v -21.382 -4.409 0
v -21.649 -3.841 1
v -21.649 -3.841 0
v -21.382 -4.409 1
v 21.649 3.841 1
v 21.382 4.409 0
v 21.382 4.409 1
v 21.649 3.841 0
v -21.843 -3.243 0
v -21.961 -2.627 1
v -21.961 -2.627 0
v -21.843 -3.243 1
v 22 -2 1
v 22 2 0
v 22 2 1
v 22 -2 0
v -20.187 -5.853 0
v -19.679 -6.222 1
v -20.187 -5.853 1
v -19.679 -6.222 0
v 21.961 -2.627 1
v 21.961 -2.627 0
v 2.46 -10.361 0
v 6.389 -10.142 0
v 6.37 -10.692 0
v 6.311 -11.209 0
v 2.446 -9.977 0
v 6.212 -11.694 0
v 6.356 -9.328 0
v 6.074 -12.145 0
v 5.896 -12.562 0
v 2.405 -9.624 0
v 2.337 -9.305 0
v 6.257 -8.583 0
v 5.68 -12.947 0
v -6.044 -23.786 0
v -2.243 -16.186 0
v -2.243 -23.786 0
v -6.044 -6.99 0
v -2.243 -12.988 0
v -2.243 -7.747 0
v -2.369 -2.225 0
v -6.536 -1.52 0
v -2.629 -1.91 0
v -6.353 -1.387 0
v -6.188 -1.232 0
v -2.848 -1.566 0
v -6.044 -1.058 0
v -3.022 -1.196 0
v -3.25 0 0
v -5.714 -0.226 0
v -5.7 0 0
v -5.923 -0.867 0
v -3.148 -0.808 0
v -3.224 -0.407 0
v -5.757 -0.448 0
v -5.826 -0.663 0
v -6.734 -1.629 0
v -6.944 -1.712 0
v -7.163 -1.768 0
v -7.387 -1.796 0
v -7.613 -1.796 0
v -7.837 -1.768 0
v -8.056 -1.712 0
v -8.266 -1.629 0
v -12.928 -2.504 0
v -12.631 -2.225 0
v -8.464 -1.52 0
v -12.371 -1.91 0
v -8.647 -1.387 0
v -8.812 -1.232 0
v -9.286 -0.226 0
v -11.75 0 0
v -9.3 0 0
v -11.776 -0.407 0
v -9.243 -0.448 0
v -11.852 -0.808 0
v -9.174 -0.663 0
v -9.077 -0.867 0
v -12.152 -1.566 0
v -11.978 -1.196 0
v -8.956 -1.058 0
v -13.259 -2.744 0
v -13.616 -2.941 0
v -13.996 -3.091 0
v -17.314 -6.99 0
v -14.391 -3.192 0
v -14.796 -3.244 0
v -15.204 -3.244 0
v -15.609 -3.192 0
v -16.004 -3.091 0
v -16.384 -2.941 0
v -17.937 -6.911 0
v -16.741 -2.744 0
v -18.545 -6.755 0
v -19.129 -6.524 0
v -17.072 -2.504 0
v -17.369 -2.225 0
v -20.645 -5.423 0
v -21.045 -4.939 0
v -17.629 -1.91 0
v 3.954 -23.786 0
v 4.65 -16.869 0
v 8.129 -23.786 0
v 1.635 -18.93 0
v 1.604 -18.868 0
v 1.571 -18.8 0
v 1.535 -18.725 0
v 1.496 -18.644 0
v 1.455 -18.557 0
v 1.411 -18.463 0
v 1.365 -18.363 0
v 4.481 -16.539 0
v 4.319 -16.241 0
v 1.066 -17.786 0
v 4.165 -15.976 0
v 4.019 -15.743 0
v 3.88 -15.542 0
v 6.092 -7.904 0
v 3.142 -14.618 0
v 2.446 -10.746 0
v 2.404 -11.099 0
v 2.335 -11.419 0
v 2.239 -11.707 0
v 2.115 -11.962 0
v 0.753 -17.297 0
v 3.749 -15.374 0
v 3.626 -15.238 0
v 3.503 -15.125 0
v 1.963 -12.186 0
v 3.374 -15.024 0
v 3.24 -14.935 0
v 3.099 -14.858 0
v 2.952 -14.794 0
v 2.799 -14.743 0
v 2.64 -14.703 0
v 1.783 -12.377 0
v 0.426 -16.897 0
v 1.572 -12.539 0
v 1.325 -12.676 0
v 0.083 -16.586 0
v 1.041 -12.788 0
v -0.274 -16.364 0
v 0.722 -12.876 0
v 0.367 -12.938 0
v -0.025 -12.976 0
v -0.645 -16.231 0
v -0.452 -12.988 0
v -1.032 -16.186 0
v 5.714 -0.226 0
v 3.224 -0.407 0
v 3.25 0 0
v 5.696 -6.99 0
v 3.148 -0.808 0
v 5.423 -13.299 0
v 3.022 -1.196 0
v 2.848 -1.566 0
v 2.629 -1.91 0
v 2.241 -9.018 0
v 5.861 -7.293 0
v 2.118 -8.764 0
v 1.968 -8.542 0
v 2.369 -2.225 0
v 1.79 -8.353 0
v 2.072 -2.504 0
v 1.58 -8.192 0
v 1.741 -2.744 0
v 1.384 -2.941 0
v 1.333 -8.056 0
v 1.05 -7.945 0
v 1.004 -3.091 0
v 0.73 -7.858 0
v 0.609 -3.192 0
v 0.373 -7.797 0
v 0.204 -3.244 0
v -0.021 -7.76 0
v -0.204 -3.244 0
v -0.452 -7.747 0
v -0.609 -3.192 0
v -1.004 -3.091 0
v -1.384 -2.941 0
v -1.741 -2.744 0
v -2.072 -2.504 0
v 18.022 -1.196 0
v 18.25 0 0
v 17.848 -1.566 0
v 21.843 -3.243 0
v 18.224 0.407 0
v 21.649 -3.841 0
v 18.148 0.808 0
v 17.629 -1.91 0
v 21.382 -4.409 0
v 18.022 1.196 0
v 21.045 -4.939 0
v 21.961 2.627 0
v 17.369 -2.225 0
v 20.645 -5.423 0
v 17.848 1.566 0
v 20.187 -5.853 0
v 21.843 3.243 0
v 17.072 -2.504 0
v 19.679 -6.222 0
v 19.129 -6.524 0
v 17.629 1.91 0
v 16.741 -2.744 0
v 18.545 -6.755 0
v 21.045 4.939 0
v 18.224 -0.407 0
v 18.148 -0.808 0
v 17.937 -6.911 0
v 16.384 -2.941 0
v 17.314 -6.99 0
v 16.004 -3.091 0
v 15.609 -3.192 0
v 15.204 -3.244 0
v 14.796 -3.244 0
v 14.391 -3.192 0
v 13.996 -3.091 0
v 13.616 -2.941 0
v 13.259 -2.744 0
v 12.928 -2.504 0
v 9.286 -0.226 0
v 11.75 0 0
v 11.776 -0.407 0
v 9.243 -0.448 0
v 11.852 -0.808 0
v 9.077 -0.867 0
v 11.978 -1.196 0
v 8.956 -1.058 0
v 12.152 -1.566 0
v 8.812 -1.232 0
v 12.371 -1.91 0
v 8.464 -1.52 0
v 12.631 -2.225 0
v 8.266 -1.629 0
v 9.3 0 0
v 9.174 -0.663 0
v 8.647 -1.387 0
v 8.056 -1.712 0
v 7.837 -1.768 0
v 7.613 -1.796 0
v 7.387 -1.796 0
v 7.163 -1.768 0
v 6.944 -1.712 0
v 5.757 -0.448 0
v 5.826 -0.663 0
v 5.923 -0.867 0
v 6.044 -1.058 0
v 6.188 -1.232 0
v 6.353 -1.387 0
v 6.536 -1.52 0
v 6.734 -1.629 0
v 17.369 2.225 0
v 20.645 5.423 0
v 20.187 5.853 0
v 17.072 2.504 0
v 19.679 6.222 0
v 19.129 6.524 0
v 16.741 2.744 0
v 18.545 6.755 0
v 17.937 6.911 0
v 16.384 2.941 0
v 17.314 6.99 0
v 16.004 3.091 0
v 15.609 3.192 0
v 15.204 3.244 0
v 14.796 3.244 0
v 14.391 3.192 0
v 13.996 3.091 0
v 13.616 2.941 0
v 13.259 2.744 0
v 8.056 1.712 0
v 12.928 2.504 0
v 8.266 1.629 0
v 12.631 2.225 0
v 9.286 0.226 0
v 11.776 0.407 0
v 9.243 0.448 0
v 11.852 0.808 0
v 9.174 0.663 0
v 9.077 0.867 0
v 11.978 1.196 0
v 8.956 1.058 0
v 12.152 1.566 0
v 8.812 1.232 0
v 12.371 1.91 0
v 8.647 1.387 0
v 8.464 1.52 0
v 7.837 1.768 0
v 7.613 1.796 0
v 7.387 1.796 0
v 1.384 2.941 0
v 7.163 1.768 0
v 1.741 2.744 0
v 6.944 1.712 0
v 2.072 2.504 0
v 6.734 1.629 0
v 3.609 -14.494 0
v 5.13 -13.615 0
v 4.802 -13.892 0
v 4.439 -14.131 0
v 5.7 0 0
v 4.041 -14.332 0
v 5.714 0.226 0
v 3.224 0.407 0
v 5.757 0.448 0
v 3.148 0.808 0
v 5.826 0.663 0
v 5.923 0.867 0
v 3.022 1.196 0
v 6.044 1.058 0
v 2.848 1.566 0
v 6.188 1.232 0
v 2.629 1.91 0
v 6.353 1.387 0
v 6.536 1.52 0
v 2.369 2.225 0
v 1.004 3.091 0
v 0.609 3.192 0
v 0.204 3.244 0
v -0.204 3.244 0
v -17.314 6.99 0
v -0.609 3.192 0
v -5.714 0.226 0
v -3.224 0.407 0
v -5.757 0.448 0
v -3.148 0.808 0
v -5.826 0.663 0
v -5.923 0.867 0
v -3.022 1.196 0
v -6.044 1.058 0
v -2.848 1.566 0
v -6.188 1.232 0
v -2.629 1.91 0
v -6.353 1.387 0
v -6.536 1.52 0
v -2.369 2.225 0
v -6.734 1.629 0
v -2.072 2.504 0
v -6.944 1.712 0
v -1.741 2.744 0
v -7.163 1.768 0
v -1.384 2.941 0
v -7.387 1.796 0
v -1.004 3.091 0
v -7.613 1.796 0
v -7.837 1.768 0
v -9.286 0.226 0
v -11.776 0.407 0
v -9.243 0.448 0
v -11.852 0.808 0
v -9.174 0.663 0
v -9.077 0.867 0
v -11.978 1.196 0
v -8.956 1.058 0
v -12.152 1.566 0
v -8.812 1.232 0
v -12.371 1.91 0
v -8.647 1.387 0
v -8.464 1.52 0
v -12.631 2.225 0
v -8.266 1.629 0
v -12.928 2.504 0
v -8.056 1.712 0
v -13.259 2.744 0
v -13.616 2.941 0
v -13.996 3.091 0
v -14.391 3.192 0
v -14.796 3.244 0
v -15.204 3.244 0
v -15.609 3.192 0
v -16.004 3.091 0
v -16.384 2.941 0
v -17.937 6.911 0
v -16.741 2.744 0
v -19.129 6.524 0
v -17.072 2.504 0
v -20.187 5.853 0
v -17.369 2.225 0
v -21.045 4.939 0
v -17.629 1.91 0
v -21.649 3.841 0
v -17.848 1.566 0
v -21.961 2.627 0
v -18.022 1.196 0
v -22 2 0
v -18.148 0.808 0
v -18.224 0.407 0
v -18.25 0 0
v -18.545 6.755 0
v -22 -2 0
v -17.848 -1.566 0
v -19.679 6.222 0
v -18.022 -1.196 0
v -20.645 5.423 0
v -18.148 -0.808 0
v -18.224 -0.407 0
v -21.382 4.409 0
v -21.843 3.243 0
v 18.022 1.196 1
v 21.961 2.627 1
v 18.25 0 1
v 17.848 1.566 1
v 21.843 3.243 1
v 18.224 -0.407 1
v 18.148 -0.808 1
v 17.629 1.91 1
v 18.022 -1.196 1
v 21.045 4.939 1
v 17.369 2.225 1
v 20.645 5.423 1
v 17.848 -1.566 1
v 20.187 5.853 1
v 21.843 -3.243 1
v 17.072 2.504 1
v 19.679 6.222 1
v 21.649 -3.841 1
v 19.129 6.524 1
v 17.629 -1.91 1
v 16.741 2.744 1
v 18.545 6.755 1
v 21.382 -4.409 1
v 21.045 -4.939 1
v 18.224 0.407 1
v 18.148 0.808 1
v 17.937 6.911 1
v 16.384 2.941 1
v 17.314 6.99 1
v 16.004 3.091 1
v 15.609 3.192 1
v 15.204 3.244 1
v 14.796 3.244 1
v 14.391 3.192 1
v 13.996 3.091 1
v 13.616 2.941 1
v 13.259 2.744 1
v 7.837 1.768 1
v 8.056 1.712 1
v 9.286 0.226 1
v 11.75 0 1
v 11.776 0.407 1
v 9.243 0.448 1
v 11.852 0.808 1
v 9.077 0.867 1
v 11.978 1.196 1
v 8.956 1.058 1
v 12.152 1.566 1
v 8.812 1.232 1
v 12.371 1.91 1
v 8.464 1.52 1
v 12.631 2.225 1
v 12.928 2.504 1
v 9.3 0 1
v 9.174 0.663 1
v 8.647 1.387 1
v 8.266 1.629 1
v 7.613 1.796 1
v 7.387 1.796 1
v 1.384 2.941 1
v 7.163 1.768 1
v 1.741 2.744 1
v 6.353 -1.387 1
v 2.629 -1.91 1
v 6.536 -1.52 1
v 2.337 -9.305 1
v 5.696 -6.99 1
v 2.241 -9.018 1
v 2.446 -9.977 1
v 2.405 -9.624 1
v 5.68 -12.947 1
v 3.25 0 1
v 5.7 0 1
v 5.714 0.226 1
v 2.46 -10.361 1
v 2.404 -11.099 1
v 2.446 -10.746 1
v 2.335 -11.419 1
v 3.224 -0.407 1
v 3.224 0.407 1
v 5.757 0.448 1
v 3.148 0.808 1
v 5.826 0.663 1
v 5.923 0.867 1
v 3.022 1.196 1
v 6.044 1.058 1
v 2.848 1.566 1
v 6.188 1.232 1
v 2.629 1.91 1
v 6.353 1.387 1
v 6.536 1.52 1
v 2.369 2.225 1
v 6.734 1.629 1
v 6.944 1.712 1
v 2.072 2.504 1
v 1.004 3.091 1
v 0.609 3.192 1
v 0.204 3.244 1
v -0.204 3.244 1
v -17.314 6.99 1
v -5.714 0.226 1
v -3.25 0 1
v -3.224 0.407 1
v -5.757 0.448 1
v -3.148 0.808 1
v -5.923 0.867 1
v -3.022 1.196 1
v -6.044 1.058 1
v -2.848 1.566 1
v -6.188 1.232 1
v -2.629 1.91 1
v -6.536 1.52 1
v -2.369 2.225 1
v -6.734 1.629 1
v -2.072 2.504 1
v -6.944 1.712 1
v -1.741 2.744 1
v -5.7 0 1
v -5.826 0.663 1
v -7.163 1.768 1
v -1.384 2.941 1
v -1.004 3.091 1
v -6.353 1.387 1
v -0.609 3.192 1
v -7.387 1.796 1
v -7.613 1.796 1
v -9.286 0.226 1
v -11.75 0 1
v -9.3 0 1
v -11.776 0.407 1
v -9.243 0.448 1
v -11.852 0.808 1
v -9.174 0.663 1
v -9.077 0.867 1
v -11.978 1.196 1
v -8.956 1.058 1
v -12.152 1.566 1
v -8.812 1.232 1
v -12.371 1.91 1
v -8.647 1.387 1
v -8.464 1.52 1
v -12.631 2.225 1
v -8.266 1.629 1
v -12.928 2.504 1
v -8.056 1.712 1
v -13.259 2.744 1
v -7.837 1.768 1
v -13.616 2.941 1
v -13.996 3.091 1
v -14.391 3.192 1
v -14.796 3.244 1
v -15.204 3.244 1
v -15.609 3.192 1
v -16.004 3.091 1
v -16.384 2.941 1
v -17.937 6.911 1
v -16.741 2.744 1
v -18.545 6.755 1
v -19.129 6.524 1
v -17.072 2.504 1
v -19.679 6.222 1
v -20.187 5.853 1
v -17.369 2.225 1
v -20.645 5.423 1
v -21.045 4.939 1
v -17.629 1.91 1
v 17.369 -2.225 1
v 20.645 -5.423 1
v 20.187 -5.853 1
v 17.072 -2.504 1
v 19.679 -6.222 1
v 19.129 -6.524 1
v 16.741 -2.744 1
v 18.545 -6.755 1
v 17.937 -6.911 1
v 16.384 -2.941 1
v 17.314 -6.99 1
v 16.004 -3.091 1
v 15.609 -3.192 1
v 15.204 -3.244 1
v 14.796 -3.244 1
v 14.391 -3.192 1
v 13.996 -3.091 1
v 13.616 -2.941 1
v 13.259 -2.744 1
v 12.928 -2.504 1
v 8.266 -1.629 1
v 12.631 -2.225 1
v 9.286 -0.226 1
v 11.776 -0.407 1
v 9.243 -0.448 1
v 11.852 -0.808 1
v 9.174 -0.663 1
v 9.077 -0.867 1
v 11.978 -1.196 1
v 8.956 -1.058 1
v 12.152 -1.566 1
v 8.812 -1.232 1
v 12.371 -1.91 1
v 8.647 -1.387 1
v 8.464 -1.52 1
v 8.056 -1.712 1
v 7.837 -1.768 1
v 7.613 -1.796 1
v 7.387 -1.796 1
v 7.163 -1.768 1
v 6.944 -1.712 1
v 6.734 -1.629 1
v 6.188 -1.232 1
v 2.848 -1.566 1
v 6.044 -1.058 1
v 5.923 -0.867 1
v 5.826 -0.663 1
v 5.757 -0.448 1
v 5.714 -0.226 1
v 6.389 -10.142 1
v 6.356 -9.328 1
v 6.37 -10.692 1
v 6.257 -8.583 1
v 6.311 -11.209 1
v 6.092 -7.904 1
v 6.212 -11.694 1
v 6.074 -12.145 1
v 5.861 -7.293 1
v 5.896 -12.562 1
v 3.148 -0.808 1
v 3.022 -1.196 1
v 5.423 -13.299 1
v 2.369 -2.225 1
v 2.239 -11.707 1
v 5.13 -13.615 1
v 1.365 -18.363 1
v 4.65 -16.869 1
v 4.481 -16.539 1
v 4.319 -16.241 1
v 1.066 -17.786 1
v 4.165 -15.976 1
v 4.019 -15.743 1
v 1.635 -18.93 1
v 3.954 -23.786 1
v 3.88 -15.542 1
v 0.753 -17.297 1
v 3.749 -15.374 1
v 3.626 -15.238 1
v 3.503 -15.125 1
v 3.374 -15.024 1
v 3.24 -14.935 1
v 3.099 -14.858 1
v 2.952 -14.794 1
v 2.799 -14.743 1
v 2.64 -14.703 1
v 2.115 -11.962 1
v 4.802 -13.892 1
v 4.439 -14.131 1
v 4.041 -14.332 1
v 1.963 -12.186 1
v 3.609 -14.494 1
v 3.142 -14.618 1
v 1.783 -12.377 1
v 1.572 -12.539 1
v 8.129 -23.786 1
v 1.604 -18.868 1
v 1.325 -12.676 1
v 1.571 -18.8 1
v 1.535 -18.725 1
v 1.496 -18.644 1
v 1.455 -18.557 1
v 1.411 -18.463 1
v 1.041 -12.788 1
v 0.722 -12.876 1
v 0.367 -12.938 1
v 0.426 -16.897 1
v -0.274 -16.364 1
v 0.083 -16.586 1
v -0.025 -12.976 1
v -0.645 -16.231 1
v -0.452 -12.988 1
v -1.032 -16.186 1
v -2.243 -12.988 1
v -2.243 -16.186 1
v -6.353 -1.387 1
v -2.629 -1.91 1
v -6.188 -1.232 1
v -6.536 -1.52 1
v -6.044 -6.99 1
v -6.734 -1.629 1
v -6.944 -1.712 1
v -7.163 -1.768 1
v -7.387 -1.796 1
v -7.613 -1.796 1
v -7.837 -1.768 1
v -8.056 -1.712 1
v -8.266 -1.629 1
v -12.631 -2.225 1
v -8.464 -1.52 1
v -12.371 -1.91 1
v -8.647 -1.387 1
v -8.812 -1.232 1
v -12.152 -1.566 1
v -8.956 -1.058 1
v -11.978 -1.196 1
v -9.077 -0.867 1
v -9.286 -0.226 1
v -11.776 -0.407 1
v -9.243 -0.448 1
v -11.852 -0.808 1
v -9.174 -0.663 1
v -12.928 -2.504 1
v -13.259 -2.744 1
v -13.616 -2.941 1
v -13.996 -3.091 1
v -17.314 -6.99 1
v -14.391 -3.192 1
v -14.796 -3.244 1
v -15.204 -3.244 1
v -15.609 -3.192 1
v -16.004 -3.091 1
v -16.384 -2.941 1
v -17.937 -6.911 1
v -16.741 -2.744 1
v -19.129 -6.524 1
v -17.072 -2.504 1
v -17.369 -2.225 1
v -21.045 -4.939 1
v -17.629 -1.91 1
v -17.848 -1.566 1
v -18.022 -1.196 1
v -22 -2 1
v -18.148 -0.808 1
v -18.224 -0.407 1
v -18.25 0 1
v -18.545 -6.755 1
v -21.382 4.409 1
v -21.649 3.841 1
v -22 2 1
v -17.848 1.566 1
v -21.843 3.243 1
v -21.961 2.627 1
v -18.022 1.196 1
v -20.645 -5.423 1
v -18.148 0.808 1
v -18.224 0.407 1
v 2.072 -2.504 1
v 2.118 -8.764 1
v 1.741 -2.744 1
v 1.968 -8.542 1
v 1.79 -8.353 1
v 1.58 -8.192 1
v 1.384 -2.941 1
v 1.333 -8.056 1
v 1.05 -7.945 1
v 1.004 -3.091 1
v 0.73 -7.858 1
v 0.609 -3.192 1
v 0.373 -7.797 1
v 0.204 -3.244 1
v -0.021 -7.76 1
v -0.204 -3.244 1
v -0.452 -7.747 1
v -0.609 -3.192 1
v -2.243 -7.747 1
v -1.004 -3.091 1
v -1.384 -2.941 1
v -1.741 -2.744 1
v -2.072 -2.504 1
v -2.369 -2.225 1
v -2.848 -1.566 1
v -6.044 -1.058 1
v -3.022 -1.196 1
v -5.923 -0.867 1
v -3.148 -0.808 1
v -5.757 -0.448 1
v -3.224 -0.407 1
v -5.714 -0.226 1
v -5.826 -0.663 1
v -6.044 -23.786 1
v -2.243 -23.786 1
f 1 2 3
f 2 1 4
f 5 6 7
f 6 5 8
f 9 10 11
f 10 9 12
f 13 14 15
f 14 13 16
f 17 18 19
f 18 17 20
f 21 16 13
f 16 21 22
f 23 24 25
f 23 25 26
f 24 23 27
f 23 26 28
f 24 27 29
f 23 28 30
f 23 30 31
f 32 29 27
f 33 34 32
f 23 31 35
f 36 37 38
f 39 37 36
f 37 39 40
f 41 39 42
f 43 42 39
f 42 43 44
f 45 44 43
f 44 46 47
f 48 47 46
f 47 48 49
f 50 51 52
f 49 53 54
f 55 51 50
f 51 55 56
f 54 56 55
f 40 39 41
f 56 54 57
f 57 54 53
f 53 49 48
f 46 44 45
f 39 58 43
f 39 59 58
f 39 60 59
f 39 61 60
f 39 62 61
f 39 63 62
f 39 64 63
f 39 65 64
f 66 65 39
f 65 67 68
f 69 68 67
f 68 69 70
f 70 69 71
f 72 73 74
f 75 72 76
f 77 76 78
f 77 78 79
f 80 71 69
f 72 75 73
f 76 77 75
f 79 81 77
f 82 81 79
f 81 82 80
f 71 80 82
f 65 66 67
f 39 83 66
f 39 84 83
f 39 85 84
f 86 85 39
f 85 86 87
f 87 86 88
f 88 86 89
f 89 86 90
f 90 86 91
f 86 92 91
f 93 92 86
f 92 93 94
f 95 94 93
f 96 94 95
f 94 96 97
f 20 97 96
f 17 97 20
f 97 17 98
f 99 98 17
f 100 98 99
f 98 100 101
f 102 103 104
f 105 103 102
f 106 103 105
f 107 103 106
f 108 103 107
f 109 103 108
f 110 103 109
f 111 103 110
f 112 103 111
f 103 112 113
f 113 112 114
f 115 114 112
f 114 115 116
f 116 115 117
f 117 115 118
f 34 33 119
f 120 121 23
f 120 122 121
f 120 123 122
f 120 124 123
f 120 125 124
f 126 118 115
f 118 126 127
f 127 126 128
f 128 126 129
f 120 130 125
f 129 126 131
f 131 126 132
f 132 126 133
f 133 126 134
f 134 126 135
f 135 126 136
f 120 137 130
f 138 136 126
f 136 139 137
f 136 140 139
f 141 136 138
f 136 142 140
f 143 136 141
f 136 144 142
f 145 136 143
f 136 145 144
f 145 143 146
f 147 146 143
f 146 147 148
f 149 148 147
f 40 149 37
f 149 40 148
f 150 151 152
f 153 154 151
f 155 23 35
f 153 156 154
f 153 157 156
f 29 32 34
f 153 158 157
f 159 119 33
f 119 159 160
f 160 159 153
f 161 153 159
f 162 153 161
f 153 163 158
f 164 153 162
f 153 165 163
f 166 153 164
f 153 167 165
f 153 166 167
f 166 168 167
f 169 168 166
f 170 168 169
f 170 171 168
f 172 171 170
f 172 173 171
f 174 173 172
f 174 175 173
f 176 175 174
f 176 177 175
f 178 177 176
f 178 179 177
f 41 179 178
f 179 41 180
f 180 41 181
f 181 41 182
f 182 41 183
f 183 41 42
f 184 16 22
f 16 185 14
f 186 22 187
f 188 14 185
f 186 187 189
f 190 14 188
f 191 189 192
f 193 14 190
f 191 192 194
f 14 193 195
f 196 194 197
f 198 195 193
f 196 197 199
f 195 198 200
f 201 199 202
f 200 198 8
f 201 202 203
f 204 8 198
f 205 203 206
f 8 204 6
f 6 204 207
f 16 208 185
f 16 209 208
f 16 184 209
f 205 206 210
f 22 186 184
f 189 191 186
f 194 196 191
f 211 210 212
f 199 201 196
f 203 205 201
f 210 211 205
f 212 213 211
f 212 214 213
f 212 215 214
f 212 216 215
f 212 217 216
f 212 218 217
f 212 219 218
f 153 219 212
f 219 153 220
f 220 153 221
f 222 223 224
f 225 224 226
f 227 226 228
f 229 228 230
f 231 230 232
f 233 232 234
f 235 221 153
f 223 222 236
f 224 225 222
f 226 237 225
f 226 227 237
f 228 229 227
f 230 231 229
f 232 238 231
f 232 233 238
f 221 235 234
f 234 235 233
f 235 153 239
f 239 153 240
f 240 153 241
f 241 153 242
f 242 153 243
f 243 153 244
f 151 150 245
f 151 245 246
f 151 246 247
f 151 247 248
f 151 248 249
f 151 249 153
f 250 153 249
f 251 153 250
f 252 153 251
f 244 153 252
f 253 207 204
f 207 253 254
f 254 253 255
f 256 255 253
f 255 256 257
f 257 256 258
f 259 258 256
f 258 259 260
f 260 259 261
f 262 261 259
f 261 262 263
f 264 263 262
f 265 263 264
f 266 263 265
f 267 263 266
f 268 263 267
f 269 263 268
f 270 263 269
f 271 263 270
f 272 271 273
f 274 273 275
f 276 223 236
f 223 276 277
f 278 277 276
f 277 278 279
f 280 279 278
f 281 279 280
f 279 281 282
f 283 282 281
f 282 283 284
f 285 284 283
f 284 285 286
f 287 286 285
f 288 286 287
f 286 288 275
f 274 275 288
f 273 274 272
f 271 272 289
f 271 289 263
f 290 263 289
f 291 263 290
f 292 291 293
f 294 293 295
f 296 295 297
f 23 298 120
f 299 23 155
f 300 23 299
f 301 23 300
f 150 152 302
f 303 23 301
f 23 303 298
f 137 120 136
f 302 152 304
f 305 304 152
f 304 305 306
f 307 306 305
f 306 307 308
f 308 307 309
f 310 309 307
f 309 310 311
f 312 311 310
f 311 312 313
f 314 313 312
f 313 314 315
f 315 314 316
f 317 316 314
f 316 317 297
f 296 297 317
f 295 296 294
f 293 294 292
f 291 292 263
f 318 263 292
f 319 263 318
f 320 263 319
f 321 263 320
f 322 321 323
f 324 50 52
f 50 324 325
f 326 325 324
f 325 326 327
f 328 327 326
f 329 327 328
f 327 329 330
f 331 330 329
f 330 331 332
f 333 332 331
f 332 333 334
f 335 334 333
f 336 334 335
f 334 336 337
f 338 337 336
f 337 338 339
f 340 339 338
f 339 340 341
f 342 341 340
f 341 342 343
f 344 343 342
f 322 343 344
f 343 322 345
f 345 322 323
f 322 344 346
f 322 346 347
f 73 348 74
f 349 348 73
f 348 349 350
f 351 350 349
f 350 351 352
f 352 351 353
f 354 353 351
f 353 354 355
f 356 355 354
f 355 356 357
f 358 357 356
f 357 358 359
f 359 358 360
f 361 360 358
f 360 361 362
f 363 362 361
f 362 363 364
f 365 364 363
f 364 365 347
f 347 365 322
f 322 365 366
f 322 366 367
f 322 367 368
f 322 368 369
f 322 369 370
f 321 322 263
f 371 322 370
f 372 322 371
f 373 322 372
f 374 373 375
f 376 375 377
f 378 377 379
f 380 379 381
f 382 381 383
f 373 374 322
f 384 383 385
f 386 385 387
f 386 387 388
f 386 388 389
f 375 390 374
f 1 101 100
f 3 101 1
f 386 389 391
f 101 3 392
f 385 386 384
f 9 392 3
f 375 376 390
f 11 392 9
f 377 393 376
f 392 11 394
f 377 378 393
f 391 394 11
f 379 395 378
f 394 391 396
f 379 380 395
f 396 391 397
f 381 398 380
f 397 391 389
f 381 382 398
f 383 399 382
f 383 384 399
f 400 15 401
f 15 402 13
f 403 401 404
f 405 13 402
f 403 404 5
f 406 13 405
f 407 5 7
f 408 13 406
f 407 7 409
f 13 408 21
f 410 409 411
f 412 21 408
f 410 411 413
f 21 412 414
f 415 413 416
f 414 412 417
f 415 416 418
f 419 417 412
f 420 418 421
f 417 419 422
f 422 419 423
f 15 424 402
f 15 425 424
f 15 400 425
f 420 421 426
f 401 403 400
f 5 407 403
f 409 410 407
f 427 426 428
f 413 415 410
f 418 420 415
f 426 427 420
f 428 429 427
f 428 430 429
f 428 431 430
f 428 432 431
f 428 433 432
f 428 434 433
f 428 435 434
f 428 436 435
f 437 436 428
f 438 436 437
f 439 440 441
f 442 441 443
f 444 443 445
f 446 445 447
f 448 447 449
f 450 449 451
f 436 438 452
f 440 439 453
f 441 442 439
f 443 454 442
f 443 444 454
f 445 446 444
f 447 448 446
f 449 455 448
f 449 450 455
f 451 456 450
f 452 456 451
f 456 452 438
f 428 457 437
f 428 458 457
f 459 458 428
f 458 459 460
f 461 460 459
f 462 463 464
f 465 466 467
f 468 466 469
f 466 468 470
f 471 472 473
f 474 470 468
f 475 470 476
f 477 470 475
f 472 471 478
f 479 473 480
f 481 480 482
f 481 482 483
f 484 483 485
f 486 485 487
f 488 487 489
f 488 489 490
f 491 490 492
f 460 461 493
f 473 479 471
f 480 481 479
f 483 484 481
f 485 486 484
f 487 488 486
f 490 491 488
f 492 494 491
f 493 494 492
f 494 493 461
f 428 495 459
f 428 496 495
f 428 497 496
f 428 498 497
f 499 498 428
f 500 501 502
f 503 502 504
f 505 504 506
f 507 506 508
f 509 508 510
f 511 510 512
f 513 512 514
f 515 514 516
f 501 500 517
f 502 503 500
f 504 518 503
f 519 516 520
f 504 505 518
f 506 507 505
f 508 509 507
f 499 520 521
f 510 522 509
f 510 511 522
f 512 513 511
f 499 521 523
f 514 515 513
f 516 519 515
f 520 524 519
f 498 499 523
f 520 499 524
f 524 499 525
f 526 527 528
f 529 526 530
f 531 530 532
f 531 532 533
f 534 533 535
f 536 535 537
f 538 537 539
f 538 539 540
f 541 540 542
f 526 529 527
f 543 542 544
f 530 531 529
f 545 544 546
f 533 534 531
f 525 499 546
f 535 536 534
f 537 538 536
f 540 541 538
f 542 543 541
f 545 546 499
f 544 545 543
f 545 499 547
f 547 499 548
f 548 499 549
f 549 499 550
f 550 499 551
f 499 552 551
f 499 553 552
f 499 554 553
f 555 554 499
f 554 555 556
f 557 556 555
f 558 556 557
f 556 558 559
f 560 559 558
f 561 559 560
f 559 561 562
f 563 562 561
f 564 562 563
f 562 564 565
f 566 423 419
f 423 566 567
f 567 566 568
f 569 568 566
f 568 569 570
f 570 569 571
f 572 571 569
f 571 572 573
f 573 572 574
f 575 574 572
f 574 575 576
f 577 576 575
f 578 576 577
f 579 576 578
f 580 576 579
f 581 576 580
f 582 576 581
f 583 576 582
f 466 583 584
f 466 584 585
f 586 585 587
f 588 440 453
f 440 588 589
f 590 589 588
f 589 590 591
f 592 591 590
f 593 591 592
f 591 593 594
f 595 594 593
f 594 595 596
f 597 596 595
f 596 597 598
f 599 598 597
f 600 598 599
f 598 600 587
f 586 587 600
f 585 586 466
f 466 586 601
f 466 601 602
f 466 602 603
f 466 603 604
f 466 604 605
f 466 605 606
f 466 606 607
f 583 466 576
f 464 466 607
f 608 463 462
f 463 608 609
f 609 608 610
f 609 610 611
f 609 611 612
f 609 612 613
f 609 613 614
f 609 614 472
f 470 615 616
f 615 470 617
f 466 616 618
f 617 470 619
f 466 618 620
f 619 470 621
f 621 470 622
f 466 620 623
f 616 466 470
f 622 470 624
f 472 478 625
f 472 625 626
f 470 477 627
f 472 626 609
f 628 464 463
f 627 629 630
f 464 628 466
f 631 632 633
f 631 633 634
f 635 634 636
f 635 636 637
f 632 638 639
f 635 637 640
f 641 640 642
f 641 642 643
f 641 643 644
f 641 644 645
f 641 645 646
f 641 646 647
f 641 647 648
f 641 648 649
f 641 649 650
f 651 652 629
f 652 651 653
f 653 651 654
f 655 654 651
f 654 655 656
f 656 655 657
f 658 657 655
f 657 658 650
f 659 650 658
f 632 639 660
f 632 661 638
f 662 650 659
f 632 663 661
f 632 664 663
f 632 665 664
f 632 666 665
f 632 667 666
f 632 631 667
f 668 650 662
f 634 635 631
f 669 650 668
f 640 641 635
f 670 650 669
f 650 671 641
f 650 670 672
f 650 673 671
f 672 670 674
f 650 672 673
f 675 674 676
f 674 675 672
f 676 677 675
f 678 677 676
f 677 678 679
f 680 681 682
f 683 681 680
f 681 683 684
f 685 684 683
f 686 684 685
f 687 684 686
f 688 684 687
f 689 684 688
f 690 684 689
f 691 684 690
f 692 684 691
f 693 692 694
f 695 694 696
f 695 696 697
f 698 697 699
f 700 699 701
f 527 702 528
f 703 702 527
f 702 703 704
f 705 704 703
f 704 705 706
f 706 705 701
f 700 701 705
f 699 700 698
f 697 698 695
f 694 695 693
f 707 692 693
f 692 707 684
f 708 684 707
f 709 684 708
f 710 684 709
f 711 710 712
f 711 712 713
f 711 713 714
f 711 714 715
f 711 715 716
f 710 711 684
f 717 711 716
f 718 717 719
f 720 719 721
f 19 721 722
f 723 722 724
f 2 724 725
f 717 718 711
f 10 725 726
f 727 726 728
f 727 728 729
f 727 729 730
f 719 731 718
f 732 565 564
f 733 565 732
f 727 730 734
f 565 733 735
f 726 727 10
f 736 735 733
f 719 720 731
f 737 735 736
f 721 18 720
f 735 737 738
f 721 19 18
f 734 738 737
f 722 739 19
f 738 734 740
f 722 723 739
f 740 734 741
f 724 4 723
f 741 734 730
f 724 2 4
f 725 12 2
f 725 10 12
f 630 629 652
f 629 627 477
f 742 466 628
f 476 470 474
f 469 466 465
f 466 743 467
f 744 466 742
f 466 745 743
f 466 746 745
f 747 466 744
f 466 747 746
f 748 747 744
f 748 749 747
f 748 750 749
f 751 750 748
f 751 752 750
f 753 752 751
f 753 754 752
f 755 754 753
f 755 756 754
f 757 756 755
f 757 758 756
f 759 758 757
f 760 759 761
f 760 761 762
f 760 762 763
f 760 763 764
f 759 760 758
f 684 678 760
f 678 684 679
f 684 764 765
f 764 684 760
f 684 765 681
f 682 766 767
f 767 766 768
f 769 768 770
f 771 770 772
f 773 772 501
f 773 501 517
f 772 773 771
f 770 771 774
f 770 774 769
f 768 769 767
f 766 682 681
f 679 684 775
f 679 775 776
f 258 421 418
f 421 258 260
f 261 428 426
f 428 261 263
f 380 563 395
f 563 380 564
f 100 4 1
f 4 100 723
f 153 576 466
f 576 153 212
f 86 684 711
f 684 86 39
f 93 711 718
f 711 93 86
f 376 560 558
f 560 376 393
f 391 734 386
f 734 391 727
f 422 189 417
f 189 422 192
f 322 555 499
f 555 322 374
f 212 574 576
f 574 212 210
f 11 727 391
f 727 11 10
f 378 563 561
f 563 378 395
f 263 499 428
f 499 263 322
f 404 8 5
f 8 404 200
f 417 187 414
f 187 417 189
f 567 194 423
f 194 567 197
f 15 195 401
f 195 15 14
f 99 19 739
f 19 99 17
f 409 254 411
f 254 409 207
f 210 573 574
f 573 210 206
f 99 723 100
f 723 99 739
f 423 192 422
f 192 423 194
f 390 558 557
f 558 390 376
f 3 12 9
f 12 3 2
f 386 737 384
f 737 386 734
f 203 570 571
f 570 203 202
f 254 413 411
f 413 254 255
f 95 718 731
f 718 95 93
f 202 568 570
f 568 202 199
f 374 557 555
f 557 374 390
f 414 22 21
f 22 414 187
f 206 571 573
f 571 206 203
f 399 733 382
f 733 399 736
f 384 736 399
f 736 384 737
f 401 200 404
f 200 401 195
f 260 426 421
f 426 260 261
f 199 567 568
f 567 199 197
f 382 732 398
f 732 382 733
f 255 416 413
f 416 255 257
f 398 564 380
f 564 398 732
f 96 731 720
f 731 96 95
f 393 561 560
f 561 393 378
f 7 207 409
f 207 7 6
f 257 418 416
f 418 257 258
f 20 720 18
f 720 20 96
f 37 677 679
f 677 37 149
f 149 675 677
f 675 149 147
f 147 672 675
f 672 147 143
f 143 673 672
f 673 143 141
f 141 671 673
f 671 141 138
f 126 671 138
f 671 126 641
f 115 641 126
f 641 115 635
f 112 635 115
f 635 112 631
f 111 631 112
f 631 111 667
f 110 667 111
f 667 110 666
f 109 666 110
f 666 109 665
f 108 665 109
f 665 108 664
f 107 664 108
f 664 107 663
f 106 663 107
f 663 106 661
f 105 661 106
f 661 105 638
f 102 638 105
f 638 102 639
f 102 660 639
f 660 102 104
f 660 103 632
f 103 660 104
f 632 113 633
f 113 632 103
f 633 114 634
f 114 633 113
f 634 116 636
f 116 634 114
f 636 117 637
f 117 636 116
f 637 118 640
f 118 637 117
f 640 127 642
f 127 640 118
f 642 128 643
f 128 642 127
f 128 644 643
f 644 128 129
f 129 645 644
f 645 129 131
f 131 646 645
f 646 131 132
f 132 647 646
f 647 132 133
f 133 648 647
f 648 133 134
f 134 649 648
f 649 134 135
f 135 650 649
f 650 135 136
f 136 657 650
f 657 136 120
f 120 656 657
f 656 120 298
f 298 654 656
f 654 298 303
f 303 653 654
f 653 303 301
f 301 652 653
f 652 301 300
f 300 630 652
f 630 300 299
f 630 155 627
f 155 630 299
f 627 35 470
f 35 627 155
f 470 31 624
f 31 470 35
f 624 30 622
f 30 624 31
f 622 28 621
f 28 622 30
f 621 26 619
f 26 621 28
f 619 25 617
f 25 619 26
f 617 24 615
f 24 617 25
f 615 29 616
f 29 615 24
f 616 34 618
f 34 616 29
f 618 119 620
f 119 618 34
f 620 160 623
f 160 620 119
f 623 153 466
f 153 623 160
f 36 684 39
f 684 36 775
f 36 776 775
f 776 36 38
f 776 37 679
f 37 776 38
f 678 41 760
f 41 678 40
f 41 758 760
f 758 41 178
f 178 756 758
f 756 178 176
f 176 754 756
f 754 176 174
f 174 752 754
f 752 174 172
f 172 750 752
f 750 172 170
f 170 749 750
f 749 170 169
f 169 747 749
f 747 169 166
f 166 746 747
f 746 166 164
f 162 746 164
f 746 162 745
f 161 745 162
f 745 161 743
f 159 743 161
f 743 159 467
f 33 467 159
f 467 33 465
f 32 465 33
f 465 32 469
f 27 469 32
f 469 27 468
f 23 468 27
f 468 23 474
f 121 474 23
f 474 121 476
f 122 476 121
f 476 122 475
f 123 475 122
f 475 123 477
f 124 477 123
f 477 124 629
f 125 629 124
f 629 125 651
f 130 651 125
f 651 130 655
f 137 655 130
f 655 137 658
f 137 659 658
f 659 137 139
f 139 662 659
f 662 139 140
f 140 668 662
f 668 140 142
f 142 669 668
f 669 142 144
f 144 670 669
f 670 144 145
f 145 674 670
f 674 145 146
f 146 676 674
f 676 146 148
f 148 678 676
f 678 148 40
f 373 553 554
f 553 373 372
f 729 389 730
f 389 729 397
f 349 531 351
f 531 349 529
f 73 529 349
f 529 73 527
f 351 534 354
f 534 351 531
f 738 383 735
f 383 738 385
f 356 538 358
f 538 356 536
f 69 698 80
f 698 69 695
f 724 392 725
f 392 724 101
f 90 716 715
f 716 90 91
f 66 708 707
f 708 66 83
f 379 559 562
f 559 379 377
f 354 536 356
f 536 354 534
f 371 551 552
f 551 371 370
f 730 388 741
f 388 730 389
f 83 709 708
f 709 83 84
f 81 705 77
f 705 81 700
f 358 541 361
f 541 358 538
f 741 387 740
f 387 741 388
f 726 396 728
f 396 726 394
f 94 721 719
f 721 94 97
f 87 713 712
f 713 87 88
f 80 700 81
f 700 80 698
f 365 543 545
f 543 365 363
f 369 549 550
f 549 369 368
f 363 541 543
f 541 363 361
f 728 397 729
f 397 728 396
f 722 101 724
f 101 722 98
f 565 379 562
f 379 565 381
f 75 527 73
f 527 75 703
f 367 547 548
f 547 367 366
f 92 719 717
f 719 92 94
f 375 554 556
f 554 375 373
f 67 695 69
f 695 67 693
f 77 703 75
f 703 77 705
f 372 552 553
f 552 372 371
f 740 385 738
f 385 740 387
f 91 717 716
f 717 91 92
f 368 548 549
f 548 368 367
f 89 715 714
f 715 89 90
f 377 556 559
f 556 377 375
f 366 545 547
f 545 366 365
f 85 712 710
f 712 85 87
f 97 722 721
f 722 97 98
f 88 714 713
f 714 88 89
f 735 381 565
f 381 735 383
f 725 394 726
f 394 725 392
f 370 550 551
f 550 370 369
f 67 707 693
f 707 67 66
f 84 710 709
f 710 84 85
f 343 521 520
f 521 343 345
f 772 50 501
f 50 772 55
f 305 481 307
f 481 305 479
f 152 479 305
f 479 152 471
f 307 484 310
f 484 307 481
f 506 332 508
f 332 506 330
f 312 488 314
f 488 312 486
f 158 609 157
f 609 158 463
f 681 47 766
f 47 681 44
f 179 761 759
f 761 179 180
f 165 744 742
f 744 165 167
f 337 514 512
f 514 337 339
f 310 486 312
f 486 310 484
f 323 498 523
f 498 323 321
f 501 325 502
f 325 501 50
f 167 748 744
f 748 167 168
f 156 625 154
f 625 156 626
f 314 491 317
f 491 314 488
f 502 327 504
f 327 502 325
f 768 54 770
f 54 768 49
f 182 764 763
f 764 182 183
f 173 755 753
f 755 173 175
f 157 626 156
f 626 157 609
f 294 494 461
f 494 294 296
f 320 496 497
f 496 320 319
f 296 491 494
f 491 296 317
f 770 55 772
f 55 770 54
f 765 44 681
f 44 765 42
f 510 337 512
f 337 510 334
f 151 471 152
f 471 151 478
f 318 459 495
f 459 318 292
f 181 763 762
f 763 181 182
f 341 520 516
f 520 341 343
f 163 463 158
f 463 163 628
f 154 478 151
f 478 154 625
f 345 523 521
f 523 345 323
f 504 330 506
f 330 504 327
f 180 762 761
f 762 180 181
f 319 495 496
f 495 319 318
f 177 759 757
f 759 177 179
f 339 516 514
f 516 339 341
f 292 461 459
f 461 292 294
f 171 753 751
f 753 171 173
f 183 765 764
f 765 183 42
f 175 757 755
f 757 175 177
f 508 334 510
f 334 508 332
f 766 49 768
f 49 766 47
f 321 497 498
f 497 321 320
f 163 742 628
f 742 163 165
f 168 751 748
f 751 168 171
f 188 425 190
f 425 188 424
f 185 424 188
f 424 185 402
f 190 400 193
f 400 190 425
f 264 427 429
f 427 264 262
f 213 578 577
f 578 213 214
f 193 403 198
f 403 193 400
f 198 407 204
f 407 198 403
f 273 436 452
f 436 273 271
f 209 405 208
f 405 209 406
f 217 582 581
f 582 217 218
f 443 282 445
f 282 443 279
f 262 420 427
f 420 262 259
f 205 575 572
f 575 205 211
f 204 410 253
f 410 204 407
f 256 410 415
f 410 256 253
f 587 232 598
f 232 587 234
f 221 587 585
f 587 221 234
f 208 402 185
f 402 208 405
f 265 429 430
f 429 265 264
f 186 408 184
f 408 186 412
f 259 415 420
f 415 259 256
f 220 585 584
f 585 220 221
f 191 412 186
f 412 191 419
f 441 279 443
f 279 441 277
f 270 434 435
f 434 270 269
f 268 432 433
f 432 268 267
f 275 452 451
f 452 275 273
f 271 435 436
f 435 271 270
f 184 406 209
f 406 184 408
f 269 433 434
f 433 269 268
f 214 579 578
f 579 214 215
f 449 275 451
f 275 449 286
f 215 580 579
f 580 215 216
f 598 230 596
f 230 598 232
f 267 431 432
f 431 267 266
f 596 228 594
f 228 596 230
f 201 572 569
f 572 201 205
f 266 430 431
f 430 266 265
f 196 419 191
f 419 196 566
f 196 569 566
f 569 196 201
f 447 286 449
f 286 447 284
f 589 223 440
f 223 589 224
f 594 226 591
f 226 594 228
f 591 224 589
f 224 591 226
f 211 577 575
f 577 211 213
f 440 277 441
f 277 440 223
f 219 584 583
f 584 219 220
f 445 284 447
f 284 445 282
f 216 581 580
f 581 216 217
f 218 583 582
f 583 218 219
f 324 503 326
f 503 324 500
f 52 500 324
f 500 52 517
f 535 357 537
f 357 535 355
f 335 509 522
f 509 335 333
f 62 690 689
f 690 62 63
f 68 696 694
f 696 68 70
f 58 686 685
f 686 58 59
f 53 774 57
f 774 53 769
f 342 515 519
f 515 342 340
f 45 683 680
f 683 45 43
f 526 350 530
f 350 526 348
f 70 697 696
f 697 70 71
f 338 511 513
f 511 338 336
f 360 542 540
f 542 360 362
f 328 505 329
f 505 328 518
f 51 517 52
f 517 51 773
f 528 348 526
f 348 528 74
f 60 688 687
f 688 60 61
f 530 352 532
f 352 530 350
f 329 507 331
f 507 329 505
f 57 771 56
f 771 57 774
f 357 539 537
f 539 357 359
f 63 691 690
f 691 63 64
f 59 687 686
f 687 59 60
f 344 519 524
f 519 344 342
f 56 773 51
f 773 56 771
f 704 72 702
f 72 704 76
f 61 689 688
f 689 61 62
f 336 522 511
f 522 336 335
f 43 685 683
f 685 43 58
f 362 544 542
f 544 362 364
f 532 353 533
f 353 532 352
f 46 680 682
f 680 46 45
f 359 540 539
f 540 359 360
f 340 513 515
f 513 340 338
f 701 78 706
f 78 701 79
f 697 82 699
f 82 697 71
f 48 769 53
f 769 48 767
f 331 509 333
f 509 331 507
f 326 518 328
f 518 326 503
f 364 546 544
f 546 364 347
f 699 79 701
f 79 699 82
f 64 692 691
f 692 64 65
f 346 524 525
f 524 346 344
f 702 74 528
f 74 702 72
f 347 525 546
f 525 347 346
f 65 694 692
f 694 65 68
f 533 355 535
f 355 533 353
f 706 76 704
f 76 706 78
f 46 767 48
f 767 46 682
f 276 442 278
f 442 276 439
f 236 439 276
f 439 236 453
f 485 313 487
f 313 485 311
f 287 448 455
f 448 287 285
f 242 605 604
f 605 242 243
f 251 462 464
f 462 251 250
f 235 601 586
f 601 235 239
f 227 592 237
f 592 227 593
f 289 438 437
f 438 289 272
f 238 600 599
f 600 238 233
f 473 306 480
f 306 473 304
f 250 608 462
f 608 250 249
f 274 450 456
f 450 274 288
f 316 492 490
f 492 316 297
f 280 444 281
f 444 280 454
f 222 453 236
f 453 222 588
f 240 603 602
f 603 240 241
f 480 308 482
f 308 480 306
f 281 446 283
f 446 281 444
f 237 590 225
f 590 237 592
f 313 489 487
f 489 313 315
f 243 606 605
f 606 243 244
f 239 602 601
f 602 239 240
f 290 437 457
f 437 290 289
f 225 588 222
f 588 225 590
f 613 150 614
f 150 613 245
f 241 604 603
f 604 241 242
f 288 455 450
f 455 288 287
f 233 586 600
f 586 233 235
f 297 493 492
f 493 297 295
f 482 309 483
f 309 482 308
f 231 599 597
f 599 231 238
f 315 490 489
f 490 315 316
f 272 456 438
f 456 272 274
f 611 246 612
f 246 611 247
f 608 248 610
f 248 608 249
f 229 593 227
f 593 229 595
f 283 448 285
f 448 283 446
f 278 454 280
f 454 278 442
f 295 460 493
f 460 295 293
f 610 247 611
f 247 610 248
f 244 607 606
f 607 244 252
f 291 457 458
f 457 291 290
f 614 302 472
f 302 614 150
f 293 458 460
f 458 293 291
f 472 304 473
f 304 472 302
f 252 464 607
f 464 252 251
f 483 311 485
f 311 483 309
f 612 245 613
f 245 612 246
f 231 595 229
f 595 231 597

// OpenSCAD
$fn = 50;


difference() {
	union() {
		hull() {
			translate(v = [-17.0000000000, 2.0000000000, 0]) {
				cylinder(h = 1, r = 5);
			}
			translate(v = [17.0000000000, 2.0000000000, 0]) {
				cylinder(h = 1, r = 5);
			}
			translate(v = [-17.0000000000, -2.0000000000, 0]) {
				cylinder(h = 1, r = 5);
			}
			translate(v = [17.0000000000, -2.0000000000, 0]) {
				cylinder(h = 1, r = 5);
			}
		}
		translate(v = [0, -5, 0]) {
			linear_extrude(height = 1) {
				text(font = "DejaVu Sans Mono:style=Bold", halign = "center", size = 19.0000000000, text = "R", valign = "top");
			}
		}
	}
	union() {
		translate(v = [-15.0000000000, 0.0000000000, 0]) {
			translate(v = [0, 0, -100]) {
				cylinder(h = 200, r = 3.2500000000);
			}
		}
		translate(v = [0, 0, -100]) {
			cylinder(h = 200, r = 3.2500000000);
		}
		translate(v = [15.0000000000, 0.0000000000, 0]) {
			translate(v = [0, 0, -100]) {
				cylinder(h = 200, r = 3.2500000000);
			}
		}
		translate(v = [-15.0000000000, 0.0000000000, 0]) {
			translate(v = [0, 0, -100]) {
				cylinder(h = 200, r = 1.8000000000);
			}
		}
		translate(v = [-7.5000000000, 0.0000000000, 0]) {
			translate(v = [0, 0, -100]) {
				cylinder(h = 200, r = 1.8000000000);
			}
		}
		translate(v = [0, 0, -100]) {
			cylinder(h = 200, r = 1.8000000000);
		}
		translate(v = [7.5000000000, 0.0000000000, 0]) {
			translate(v = [0, 0, -100]) {
				cylinder(h = 200, r = 1.8000000000);
			}
		}
		translate(v = [15.0000000000, 0.0000000000, 0]) {
			translate(v = [0, 0, -100]) {
				cylinder(h = 200, r = 1.8000000000);
			}
		}
	}
}
